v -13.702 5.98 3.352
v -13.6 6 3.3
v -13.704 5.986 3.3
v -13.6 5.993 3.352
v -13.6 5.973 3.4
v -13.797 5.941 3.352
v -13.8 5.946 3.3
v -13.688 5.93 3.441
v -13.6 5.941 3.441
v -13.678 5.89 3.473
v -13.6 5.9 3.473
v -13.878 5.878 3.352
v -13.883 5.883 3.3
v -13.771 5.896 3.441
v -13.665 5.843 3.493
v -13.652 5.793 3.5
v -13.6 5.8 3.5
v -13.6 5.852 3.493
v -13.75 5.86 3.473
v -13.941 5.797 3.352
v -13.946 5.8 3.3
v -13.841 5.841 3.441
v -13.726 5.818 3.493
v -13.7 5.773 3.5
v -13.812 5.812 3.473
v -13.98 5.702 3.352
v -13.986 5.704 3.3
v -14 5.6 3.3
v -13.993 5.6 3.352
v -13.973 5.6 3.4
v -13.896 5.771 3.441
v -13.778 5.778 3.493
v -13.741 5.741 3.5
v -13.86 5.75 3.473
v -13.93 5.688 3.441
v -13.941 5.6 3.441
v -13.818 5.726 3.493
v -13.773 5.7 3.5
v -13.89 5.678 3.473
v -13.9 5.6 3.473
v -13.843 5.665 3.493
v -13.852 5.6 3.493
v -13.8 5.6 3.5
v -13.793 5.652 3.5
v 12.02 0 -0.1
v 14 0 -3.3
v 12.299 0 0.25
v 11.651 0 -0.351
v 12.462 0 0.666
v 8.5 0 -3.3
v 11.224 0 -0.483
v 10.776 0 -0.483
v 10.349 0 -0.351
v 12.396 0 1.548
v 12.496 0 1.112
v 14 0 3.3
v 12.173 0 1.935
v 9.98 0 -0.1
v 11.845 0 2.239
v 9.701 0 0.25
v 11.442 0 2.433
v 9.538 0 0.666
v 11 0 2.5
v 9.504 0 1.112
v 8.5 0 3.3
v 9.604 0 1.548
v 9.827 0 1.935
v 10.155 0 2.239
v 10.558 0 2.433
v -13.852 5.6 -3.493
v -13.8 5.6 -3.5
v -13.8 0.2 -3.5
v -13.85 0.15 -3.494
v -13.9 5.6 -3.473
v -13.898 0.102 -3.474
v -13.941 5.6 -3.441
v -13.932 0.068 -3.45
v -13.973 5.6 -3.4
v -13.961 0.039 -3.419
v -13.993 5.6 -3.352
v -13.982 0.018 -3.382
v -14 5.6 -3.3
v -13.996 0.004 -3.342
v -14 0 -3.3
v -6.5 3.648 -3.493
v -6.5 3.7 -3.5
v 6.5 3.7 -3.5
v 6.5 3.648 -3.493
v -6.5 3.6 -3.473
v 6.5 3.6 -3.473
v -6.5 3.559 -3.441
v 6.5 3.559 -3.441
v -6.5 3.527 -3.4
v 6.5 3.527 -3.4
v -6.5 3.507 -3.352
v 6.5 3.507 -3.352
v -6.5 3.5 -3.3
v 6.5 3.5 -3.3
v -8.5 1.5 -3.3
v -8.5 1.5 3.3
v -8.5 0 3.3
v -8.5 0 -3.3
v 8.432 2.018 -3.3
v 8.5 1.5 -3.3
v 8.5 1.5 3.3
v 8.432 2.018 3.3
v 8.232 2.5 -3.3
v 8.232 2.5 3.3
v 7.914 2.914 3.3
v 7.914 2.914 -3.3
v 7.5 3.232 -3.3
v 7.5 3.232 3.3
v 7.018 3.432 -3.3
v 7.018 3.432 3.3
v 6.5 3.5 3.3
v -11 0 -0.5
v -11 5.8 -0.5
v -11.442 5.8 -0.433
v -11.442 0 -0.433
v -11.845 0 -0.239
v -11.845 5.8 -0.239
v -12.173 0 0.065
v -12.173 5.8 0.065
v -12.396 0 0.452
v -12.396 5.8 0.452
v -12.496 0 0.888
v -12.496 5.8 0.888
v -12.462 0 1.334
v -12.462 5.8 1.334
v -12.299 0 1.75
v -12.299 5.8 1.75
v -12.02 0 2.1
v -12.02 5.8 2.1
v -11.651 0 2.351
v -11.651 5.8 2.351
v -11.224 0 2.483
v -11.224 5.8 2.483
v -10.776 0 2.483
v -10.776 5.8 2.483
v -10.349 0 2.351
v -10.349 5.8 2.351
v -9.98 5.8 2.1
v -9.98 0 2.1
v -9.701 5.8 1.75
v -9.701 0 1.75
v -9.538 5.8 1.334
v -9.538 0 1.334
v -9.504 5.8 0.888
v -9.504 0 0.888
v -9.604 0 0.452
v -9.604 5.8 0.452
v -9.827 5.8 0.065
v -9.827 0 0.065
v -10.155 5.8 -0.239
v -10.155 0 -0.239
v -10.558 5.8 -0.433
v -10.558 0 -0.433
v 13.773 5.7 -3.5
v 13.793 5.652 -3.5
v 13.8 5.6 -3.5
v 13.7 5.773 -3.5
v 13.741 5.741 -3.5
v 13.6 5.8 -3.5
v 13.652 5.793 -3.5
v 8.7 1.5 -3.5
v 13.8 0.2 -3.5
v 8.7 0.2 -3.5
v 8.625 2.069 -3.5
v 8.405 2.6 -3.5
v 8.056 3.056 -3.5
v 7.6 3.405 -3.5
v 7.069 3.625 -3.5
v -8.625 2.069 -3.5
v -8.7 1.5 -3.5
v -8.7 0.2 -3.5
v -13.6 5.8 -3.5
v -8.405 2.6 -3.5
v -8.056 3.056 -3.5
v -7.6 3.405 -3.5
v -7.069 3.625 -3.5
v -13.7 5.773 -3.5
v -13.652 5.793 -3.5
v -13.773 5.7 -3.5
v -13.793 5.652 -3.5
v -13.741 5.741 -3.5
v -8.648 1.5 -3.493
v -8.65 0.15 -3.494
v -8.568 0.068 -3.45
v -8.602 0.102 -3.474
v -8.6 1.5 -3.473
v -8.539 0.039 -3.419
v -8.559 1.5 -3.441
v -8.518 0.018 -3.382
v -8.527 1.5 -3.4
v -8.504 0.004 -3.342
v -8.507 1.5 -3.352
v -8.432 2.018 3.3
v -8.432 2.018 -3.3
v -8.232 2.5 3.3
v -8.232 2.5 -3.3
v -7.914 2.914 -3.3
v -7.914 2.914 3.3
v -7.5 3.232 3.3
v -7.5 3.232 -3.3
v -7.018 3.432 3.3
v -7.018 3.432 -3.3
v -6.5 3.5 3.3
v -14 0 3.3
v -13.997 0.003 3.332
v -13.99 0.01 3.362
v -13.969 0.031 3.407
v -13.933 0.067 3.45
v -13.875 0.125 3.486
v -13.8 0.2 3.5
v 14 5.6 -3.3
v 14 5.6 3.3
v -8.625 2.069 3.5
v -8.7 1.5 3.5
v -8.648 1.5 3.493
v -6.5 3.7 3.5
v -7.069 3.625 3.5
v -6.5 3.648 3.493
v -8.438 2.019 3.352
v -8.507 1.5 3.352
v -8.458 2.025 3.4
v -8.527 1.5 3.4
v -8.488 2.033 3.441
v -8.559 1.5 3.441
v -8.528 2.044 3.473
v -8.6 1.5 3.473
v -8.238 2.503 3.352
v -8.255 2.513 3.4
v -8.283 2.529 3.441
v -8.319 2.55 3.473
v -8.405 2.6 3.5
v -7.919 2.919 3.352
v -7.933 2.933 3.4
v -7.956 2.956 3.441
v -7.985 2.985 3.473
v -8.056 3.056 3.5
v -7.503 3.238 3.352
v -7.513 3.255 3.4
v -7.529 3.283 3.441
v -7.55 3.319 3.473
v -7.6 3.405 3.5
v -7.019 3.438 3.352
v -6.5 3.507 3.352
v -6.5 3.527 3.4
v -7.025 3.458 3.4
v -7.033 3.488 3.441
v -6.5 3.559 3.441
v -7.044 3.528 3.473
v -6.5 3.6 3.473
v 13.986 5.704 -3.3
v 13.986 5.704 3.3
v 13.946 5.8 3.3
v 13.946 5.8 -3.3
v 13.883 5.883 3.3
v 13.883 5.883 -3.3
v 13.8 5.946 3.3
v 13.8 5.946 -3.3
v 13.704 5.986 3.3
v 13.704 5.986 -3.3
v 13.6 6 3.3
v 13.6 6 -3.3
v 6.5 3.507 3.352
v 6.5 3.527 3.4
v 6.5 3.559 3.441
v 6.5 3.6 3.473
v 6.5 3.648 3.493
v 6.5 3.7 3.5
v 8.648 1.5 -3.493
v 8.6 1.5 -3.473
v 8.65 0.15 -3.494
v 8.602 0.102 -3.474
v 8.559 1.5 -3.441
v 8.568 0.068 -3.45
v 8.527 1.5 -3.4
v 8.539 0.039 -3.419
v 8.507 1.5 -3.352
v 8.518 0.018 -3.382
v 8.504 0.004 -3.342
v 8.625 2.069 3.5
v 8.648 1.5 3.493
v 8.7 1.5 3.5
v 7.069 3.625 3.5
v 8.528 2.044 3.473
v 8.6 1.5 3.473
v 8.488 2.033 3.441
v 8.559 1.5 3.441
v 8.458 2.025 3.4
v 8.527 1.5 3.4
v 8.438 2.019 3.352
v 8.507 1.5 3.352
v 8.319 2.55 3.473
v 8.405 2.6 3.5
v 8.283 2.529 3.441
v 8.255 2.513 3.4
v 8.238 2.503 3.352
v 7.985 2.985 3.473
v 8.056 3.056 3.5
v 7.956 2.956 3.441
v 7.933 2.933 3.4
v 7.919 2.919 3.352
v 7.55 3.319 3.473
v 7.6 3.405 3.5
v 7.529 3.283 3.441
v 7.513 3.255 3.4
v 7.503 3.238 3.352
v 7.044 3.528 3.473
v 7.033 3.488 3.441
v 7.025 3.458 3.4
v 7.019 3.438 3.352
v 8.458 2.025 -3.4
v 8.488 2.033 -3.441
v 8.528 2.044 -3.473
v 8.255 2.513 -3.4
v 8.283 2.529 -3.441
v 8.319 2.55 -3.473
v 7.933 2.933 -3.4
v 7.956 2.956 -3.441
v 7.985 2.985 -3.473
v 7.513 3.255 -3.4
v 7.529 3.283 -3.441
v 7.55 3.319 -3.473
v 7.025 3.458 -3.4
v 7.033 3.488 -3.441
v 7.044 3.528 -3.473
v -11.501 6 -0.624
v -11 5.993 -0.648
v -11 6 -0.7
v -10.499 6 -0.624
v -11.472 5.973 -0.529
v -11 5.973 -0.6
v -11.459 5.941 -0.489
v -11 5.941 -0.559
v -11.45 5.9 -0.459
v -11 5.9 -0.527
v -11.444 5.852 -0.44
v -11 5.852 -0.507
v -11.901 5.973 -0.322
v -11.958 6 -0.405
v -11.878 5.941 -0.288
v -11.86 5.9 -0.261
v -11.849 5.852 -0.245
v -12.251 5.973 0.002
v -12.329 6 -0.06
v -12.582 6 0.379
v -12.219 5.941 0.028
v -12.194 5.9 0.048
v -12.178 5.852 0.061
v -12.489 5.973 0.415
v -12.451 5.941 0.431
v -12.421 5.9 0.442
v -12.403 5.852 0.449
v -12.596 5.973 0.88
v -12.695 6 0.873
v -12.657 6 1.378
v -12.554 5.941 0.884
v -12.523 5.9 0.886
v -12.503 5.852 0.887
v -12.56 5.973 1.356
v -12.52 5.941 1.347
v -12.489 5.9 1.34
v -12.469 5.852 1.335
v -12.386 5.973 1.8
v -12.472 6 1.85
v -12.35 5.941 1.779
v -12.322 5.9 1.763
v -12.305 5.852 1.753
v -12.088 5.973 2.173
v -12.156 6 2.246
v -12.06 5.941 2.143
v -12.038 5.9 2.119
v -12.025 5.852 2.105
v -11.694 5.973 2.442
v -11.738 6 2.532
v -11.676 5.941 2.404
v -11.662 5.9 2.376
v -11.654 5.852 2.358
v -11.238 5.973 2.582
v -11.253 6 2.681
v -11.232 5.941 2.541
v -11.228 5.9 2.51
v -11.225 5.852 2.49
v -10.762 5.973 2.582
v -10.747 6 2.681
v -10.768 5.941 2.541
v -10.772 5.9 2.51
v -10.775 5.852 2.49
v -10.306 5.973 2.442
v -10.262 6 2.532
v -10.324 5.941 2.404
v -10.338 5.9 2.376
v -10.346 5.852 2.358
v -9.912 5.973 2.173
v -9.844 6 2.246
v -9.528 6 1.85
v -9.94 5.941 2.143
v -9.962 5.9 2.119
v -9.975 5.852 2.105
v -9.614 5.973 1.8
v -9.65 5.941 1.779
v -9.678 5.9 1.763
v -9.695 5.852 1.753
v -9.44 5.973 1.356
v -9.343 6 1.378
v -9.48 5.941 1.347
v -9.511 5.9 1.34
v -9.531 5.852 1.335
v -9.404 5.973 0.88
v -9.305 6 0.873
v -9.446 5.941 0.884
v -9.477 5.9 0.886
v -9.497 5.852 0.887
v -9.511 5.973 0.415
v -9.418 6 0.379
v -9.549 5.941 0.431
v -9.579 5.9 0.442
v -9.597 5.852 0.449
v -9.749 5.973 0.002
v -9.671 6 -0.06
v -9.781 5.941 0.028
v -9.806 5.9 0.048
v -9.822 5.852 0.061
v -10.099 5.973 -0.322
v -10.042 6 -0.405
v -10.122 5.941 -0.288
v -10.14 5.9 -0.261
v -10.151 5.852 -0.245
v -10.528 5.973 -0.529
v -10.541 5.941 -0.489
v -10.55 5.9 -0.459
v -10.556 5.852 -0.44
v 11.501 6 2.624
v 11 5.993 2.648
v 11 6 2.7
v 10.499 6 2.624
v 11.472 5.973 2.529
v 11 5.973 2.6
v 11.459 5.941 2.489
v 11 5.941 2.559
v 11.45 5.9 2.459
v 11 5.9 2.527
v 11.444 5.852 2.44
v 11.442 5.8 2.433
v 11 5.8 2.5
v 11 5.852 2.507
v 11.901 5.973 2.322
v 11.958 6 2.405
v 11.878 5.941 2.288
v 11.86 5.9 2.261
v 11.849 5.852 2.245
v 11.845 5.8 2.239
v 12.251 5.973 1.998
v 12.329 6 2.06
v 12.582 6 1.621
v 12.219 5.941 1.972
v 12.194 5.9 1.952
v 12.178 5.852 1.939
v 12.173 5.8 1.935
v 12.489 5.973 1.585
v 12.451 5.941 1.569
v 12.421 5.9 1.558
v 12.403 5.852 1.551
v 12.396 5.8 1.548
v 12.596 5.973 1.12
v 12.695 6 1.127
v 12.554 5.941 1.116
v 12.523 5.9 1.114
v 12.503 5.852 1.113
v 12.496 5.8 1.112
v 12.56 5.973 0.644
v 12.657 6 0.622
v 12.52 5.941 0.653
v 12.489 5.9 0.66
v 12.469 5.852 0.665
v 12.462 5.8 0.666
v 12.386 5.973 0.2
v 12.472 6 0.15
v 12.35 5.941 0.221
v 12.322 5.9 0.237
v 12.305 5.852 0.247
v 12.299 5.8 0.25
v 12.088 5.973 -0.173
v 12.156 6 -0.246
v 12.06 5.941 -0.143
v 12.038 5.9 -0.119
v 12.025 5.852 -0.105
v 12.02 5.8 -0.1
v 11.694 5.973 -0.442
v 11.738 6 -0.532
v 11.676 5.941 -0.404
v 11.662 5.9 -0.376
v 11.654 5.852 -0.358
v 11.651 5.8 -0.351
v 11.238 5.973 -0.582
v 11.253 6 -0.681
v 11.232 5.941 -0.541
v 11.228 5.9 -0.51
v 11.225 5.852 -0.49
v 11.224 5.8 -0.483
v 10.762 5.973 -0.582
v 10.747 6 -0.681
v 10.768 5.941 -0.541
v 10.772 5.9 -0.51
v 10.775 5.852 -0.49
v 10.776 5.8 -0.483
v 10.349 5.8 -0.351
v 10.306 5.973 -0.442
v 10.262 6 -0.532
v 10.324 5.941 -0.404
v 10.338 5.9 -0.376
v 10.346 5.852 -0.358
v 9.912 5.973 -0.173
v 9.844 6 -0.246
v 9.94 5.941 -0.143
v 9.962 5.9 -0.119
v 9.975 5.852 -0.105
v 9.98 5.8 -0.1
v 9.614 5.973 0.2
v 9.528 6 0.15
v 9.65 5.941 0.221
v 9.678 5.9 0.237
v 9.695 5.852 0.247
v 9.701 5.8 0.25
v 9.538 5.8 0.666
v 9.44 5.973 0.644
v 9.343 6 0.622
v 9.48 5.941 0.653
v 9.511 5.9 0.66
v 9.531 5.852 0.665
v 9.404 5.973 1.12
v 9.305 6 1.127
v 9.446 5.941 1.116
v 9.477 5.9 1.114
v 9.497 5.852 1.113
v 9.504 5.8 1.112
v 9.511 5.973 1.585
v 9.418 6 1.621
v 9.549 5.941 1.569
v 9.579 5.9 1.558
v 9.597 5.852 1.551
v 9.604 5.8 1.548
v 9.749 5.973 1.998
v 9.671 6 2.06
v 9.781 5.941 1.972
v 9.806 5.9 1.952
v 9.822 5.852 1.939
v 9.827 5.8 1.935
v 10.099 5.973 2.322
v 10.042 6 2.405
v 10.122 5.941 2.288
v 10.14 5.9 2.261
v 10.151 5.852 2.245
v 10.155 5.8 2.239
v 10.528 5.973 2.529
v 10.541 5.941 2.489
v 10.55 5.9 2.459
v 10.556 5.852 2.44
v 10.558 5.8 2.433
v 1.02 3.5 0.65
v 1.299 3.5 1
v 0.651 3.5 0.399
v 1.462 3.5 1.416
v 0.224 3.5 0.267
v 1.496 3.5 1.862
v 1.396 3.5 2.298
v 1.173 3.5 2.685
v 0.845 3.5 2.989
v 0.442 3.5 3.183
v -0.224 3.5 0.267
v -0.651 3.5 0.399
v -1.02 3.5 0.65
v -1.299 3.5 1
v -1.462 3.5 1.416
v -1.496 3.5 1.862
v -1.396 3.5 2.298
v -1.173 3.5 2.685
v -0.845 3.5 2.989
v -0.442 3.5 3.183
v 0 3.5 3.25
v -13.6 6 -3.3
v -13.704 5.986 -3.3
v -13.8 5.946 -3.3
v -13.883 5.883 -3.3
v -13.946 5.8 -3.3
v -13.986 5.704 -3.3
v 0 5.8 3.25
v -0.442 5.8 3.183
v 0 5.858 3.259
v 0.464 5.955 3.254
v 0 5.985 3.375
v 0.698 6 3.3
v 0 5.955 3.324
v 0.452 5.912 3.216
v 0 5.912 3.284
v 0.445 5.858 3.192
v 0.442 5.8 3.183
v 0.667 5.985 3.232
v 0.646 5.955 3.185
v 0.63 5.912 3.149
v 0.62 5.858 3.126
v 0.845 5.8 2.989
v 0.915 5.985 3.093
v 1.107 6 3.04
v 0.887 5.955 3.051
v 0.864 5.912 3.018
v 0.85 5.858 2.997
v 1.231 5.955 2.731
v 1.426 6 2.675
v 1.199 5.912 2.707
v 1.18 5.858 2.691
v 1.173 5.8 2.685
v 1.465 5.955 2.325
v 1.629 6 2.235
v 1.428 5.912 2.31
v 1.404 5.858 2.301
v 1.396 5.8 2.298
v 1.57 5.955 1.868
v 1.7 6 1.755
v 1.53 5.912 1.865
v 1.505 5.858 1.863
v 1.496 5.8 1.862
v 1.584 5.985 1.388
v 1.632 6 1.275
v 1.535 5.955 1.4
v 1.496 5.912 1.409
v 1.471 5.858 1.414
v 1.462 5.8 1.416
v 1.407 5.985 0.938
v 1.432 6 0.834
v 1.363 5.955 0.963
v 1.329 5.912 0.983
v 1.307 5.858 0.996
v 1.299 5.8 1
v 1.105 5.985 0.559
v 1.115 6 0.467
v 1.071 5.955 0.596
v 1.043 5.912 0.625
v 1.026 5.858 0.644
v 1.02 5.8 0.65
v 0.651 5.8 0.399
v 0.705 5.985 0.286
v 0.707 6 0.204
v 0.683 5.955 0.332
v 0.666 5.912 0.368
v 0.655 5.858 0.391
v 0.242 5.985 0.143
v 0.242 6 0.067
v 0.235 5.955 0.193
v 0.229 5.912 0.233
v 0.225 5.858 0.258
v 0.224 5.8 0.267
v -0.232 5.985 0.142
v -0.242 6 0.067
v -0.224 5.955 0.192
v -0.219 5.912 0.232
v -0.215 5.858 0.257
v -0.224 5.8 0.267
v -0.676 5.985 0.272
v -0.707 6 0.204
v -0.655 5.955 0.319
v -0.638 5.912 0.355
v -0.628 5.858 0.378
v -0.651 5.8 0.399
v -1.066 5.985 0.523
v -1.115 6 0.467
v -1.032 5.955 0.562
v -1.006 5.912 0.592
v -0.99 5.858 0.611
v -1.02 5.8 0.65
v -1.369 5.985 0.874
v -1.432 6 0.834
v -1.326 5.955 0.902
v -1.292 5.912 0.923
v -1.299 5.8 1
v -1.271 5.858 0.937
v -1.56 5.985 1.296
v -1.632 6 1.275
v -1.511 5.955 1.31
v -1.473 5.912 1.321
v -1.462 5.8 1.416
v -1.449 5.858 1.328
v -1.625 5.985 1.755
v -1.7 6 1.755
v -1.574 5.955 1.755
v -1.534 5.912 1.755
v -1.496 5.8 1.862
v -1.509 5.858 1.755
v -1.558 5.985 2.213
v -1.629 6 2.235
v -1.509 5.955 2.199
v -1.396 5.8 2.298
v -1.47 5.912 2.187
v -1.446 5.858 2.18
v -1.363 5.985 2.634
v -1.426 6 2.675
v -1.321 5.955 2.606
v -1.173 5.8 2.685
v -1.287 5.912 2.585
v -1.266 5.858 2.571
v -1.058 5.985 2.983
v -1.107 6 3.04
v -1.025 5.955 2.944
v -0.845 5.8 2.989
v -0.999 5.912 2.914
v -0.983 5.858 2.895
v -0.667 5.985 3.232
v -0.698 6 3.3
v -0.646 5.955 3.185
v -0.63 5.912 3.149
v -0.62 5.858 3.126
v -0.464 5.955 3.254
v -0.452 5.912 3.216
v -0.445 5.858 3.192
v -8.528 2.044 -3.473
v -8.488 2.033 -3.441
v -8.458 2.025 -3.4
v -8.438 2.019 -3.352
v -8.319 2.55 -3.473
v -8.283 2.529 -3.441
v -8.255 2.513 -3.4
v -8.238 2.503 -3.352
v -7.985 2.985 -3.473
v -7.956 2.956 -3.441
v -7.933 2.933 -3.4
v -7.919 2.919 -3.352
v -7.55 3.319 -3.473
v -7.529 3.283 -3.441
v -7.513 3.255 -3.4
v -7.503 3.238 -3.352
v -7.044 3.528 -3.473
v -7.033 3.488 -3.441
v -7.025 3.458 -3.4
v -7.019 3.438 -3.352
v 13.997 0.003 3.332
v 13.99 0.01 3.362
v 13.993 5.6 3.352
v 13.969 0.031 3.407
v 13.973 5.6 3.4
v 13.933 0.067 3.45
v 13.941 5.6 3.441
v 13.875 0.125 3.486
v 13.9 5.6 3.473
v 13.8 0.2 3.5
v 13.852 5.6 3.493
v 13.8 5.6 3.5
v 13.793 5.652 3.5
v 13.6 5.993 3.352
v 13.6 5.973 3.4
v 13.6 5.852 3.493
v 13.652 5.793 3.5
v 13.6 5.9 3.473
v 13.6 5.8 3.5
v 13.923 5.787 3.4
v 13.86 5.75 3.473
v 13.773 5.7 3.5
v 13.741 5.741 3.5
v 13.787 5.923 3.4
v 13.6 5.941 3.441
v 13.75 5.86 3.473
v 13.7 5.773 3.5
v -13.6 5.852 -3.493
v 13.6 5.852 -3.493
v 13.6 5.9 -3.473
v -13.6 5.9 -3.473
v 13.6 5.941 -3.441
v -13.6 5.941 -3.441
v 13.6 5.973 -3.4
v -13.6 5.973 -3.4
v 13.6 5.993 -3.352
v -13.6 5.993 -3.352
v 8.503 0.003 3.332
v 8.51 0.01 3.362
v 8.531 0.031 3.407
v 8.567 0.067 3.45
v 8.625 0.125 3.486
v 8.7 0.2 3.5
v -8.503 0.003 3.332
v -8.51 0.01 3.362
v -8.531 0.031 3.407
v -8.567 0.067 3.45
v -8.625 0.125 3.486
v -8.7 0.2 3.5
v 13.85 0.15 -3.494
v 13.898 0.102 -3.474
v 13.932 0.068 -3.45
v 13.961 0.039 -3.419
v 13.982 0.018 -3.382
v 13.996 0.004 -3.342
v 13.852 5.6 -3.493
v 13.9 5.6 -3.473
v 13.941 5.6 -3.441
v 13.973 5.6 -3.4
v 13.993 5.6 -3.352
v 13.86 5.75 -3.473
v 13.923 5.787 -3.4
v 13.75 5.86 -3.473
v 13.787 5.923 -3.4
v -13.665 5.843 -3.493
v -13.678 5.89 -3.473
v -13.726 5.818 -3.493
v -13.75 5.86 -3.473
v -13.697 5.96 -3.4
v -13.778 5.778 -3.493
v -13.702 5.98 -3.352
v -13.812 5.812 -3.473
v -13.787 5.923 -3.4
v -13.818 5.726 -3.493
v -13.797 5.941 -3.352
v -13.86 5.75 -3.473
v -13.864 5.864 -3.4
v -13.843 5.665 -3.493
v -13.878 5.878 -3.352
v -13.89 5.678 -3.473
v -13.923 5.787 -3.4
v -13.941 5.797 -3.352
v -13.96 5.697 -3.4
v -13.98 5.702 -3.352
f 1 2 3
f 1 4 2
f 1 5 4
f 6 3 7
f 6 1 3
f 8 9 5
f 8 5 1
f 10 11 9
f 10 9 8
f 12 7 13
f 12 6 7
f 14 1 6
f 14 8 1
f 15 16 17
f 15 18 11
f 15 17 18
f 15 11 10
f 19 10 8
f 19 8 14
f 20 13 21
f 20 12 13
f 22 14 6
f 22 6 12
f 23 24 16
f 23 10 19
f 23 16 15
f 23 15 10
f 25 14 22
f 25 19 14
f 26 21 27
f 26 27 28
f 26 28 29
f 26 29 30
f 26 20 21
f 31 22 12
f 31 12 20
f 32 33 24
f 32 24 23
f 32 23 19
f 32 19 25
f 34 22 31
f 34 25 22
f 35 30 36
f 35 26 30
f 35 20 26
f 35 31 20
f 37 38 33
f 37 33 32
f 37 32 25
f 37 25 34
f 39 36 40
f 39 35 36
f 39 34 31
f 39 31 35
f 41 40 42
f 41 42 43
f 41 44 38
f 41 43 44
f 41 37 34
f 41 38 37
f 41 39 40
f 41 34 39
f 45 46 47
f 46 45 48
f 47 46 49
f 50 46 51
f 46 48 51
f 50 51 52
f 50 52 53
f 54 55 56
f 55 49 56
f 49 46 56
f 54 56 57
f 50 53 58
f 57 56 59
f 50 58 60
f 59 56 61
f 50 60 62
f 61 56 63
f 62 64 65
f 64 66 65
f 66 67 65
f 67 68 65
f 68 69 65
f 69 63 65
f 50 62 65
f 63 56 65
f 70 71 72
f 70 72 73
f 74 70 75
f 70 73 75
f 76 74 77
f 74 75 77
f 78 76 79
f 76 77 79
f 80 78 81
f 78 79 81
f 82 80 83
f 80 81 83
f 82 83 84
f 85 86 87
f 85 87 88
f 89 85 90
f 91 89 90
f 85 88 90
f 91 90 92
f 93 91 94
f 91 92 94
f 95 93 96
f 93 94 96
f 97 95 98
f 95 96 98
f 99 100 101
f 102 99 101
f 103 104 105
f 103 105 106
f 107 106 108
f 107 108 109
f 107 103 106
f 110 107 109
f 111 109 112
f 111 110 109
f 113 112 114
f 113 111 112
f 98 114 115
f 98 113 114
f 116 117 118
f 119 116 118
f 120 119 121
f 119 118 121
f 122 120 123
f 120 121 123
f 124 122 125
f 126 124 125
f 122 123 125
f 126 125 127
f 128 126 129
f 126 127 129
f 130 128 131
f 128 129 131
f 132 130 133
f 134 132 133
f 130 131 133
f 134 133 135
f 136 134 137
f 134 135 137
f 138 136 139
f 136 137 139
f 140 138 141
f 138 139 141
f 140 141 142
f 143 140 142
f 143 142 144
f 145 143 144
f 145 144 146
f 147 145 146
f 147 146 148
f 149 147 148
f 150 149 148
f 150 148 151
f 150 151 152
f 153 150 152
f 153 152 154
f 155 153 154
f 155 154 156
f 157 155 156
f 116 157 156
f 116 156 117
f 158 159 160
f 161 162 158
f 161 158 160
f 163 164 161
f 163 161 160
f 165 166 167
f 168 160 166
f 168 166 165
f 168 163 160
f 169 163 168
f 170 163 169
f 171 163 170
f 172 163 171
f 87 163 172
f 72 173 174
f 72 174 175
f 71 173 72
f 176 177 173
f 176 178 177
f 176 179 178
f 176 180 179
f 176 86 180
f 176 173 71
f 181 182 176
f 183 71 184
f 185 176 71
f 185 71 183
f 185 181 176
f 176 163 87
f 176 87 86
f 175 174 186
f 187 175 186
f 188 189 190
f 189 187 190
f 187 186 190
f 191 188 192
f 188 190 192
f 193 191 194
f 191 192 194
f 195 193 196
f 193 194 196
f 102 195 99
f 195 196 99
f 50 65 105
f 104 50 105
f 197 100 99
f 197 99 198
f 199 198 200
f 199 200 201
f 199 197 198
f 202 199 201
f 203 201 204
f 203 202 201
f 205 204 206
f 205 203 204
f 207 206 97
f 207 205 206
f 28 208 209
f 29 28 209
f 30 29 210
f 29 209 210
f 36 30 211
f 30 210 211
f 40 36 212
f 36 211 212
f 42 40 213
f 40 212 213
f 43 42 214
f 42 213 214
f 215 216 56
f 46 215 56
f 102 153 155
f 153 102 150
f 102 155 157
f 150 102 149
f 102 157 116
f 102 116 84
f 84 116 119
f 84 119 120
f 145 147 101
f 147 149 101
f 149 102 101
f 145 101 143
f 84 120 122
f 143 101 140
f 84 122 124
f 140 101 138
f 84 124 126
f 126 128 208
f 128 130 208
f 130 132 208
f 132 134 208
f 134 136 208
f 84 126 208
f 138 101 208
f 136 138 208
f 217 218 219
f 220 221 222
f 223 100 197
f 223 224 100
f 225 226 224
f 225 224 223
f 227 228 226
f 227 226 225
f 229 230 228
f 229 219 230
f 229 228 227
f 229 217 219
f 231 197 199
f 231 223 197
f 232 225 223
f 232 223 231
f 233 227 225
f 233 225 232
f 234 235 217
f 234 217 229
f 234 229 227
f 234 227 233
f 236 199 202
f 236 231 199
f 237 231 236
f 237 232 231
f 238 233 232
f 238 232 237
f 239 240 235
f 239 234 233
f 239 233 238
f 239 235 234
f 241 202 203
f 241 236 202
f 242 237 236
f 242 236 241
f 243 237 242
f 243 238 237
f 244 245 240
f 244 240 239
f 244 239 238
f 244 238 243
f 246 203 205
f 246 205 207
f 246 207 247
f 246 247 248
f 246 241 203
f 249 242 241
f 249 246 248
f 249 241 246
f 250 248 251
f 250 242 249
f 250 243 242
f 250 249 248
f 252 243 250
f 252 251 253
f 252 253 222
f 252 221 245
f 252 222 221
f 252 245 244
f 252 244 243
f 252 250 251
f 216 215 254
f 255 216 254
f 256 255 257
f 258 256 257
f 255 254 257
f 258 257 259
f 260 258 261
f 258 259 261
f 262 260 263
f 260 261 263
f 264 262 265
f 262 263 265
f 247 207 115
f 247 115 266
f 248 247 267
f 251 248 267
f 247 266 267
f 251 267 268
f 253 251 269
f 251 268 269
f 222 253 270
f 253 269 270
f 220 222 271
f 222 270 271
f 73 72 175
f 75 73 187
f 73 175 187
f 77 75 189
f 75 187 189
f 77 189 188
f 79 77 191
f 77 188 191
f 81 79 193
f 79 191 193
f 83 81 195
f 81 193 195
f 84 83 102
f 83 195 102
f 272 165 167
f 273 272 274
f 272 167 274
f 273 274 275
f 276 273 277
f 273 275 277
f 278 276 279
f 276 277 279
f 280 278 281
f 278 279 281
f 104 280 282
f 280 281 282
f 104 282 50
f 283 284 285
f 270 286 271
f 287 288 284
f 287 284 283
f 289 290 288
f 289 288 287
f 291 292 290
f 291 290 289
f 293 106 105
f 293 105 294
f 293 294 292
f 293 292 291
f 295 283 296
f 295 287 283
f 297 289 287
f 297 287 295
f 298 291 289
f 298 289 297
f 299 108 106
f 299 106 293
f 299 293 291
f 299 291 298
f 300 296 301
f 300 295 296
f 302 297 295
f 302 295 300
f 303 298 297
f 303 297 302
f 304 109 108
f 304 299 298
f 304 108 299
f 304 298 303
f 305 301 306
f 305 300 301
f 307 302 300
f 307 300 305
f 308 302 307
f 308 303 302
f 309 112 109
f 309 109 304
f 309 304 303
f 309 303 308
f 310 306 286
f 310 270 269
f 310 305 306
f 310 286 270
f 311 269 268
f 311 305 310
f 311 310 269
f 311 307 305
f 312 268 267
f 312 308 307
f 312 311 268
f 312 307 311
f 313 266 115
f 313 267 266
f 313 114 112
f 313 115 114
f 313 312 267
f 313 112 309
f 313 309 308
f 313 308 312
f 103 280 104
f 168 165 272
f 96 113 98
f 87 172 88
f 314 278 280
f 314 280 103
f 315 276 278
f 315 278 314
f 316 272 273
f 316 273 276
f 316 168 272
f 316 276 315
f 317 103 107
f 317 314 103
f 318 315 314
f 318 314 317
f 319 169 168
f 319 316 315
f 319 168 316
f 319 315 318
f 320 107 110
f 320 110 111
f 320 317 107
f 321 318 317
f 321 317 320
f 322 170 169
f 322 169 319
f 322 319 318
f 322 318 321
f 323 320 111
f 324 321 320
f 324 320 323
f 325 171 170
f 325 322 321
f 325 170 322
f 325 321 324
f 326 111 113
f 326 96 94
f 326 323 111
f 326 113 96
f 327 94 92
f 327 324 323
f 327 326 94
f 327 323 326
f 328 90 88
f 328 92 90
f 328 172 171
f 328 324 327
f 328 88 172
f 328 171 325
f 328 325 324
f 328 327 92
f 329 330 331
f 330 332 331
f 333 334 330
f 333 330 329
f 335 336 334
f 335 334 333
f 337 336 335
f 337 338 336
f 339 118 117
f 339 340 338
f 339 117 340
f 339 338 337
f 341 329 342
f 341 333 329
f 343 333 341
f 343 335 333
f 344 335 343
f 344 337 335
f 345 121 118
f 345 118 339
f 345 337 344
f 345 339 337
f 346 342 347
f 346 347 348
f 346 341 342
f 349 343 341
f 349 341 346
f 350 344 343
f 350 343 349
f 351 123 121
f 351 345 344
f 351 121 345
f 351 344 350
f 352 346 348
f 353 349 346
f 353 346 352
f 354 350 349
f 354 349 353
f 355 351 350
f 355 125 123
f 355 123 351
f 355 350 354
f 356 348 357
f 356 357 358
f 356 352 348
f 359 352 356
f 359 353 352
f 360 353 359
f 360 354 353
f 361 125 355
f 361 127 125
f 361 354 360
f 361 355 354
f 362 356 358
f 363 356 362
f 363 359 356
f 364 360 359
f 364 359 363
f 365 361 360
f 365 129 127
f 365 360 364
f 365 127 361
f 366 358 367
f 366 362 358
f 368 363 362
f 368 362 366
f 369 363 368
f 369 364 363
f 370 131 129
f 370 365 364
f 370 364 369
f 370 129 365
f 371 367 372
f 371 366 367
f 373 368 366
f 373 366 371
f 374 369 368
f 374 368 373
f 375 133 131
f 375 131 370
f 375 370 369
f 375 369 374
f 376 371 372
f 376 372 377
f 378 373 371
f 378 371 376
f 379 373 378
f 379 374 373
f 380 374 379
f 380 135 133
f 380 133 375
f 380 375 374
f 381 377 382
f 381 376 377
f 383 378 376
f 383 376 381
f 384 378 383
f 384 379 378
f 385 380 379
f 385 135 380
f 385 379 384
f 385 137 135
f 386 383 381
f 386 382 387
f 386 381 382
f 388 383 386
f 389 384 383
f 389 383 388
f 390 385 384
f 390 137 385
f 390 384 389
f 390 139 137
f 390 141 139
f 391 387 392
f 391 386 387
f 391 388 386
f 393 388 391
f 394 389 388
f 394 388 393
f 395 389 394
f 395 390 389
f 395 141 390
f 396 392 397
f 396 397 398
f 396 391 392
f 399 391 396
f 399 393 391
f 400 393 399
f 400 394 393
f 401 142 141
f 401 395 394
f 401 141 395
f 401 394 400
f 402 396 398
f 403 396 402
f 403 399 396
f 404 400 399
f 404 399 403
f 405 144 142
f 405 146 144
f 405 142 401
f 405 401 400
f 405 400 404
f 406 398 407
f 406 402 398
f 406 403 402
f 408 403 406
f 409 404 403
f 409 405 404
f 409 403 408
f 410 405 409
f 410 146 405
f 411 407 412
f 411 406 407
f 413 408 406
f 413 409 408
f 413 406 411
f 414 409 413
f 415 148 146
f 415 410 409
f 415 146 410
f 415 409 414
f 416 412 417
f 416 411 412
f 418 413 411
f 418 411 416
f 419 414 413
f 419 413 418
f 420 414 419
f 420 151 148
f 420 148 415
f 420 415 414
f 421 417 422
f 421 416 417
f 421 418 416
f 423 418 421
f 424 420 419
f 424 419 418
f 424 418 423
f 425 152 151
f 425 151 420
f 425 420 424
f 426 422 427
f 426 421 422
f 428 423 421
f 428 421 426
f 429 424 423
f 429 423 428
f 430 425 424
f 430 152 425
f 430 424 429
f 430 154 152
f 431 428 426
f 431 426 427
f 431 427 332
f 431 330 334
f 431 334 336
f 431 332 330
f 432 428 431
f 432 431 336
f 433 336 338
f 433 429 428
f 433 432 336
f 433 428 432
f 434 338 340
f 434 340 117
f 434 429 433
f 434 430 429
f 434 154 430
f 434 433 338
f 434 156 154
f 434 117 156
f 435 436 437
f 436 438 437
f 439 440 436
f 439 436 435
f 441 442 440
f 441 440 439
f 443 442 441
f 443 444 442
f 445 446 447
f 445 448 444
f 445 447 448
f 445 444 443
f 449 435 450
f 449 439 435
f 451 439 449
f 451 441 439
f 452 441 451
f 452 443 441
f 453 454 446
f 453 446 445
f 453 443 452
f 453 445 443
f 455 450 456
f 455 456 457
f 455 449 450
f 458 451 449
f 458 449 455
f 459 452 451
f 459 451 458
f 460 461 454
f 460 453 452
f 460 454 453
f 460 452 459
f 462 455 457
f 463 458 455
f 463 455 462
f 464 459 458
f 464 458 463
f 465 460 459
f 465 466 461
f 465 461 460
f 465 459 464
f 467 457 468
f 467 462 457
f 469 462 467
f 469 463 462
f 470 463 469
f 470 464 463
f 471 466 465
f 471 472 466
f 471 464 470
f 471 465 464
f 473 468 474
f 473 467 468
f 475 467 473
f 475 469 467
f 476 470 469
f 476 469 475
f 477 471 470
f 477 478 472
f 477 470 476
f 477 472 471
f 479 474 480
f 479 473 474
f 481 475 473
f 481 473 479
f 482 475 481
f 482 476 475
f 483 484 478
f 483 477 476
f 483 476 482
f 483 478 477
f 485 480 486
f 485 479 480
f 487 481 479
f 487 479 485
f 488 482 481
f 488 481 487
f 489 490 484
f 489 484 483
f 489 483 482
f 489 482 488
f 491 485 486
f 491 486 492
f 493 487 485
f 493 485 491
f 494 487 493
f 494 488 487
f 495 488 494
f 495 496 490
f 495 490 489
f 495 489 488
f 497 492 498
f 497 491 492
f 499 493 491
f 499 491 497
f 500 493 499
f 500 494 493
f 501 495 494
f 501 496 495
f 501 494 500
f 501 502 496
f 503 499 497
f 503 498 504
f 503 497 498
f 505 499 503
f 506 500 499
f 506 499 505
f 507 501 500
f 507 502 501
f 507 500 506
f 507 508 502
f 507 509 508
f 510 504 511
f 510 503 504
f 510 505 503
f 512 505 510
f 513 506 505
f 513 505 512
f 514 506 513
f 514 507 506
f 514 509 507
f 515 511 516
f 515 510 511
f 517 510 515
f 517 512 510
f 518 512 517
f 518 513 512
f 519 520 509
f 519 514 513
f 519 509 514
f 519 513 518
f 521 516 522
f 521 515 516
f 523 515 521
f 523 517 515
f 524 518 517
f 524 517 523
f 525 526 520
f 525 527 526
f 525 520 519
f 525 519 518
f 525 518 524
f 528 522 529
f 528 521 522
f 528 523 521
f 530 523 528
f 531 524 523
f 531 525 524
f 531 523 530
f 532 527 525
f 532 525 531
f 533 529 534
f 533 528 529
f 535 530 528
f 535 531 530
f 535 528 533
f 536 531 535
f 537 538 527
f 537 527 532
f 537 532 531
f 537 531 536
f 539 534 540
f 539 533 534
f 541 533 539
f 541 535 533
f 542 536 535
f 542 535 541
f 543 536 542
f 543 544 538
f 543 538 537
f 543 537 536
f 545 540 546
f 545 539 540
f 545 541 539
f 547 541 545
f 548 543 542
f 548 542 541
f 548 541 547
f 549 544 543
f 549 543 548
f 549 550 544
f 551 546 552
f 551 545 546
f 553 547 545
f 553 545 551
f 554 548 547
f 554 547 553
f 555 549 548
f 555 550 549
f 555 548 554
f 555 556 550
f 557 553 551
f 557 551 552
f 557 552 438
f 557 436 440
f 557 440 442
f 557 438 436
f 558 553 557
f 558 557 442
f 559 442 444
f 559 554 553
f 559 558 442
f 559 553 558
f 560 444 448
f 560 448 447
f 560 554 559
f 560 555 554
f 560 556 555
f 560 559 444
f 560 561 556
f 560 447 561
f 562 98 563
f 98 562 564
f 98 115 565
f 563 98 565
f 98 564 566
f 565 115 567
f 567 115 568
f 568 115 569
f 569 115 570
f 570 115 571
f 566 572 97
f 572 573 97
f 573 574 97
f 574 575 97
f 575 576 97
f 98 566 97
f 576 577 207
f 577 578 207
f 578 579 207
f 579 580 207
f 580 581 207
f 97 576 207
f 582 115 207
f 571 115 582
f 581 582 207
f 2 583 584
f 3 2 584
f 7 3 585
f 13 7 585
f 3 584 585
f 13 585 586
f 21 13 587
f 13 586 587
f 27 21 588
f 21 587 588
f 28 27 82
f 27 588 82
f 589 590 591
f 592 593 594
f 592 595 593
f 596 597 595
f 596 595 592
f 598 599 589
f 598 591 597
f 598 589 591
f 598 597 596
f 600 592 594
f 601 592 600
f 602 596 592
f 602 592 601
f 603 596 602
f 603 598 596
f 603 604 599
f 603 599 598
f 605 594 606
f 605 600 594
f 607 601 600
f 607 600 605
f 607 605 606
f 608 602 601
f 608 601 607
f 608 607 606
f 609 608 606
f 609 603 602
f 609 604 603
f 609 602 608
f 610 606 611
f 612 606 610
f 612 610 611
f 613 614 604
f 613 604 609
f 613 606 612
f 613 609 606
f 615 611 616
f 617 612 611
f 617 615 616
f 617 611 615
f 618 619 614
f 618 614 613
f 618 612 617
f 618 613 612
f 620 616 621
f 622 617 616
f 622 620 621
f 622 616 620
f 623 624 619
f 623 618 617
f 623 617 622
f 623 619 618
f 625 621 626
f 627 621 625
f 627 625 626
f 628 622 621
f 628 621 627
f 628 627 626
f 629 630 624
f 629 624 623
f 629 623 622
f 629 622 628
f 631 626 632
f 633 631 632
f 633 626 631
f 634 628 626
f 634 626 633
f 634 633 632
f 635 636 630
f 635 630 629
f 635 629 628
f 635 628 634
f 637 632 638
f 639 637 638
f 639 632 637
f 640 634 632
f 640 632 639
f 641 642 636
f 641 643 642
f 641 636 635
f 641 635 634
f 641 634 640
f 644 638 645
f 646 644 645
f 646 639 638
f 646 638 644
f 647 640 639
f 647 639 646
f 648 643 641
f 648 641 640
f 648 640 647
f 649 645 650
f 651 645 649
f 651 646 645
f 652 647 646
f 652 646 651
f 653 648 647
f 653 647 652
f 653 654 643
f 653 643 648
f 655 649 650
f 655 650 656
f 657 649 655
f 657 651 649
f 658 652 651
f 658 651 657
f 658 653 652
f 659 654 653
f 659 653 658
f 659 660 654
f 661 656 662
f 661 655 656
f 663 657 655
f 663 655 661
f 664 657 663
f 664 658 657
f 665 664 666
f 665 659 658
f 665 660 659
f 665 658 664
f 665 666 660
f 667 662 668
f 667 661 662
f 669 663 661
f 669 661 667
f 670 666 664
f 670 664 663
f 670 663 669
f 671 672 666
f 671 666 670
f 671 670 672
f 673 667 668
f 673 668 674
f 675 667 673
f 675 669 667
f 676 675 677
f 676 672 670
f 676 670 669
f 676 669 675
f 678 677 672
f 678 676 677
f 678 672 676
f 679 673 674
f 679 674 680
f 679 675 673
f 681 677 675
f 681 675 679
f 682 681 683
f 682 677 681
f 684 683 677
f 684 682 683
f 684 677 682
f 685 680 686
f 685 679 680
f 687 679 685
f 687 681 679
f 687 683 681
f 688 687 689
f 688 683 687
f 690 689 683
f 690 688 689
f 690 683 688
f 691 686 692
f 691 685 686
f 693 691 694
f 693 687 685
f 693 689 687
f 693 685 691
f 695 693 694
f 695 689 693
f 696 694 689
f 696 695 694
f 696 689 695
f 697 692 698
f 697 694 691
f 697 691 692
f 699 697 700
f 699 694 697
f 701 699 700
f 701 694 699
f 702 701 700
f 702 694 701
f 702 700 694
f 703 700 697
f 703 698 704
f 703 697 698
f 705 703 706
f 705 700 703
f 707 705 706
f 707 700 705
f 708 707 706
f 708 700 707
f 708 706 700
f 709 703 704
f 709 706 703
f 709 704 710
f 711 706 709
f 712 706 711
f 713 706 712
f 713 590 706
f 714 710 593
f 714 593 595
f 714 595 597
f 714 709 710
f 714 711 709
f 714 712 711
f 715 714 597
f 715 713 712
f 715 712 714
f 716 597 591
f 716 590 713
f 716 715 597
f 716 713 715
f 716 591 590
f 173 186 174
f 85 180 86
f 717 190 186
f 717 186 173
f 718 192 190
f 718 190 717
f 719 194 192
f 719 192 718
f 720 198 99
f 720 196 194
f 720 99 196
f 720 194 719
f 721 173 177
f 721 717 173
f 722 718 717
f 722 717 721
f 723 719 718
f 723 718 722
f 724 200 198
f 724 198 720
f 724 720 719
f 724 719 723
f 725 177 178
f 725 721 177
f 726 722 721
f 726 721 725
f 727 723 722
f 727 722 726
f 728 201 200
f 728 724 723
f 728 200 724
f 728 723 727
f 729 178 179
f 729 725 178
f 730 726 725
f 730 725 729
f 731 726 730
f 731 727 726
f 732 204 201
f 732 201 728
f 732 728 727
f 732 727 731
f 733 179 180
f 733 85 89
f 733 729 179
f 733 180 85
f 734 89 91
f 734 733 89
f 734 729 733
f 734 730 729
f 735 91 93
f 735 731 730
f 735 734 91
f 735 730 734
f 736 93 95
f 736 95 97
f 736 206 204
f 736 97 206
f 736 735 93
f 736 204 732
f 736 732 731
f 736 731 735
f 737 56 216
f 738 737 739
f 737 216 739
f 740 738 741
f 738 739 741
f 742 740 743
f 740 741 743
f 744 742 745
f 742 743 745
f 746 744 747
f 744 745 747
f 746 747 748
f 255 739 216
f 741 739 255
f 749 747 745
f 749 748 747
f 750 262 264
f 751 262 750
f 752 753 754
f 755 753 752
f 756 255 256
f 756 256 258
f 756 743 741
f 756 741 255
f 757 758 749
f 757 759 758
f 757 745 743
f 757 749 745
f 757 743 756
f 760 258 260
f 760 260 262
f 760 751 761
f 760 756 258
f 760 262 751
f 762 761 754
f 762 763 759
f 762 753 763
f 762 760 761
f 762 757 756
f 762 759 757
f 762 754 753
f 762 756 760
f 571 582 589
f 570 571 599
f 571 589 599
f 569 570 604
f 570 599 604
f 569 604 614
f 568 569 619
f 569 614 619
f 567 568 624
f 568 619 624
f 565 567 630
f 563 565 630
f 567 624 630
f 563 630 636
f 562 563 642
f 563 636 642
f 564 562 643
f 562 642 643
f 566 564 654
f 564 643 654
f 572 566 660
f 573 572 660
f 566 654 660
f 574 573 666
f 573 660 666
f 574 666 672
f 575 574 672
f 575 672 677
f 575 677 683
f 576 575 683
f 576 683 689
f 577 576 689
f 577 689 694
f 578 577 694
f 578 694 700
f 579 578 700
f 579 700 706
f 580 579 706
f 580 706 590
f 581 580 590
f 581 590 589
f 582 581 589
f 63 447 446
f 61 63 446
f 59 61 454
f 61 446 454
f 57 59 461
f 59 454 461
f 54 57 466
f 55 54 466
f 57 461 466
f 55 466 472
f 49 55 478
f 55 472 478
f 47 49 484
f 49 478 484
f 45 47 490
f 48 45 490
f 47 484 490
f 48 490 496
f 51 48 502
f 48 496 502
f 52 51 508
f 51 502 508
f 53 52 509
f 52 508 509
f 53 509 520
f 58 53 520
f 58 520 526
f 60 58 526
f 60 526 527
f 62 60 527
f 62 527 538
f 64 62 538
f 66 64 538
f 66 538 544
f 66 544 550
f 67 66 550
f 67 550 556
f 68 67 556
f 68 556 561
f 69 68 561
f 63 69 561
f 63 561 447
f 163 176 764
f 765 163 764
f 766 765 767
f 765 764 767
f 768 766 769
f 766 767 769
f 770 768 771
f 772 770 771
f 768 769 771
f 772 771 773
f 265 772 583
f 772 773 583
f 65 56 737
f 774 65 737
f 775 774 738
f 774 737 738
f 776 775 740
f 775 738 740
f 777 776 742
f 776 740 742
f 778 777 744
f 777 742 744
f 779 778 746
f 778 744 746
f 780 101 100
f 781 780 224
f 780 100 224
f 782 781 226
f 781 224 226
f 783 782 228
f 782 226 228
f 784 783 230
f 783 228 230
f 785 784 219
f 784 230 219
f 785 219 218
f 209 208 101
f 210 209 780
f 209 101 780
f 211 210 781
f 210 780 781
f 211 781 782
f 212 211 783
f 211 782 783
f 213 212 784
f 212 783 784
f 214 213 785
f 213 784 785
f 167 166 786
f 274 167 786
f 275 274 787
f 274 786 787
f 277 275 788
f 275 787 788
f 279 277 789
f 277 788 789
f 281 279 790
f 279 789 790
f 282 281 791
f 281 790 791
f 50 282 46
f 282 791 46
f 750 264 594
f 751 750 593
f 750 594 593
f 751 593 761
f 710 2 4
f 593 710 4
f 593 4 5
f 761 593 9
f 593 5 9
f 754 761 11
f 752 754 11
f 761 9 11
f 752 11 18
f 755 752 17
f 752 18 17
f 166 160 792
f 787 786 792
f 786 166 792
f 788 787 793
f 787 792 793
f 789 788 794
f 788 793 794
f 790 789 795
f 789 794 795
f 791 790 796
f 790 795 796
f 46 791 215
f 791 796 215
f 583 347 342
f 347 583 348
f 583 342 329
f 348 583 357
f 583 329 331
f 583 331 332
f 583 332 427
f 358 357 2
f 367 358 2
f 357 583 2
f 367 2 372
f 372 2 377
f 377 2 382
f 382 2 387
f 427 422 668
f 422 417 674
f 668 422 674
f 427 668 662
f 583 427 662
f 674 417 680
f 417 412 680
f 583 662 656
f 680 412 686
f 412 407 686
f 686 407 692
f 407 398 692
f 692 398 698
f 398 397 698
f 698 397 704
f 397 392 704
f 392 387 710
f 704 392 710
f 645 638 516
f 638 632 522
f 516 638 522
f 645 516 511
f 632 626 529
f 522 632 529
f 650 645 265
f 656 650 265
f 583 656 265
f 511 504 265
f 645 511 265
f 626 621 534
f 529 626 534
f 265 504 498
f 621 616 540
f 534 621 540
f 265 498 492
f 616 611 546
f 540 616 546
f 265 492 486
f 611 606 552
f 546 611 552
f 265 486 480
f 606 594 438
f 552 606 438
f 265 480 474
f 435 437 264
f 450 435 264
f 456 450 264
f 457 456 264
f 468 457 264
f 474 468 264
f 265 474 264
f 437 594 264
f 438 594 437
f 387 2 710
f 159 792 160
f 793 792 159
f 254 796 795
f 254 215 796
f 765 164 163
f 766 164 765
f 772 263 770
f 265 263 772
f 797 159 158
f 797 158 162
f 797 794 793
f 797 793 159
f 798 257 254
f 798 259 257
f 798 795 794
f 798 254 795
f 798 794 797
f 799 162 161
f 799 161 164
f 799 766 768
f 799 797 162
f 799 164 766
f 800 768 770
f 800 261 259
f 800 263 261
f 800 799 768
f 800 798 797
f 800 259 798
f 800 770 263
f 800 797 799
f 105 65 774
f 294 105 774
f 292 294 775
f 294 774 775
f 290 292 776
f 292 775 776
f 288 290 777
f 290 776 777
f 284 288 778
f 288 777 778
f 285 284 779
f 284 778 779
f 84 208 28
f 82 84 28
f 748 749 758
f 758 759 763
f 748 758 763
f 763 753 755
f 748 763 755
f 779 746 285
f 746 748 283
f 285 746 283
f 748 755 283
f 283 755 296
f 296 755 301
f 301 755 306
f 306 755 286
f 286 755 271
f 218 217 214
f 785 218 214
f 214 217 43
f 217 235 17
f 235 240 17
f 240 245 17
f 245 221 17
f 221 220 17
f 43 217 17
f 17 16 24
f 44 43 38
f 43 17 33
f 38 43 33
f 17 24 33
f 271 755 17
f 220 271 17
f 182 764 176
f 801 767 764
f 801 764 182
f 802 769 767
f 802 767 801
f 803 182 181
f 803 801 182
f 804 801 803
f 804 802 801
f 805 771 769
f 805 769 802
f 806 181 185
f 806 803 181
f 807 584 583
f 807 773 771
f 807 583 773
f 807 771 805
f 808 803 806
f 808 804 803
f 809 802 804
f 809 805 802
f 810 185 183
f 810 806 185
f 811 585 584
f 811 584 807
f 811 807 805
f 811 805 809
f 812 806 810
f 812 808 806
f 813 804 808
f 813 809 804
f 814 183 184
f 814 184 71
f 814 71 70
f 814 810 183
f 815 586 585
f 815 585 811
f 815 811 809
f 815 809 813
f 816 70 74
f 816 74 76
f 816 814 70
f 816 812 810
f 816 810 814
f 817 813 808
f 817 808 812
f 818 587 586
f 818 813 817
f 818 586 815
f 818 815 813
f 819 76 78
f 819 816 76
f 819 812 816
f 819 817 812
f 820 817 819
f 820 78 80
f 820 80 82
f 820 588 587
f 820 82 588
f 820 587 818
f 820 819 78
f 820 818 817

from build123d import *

# Parameters (mm, degrees)
BOSS_EXTRUDE1_DEPTH = 3.5
SKETCH2_R           = 1.5
CUT_EXTRUDE1_DEPTH  = 16.628499608
FILLET1_R           = 2
FILLET2_R           = 0.4
FILLET3_R           = 0.2


with BuildPart() as part:
    # Sketch1 → Boss-Extrude1 (new, symmetric)
    with BuildSketch(Plane.XY):
        Polygon((-14, 0), (-14, 6), (14, 6), (14, 0), (8.5, 0), (8.5, 3.5), (-8.5, 3.5), (-8.5, 0), align=None)
    extrude(amount=BOSS_EXTRUDE1_DEPTH, both=True)

    # Sketch2 → Cut-Extrude1 (cut, through all)
    with BuildSketch(Plane(origin=(0, 6, 0), x_dir=(1, 0, 0), z_dir=(0, 1, 0))):
        with Locations(Location((11, -1, 0), (0, 0, 270))):
            Circle(SKETCH2_R)
        with Locations(Location((-11, -1, 0), (0, 0, 90))):
            Circle(SKETCH2_R)
        with Locations(Location((0, -1.75, 0), (0, 0, 270))):
            Circle(SKETCH2_R)
    extrude(amount=-CUT_EXTRUDE1_DEPTH, mode=Mode.SUBTRACT)

    # Fillet1
    fillet1_edges = [part.edges().sort_by_distance(p)[0] for p in [
        (8.5, 3.5, 0),
        (-8.5, 3.5, 0),
    ]]
    fillet(fillet1_edges, radius=FILLET1_R)

    # Fillet2
    fillet2_edges = [part.edges().sort_by_distance(p)[0] for p in [
        (-14, 6, 0),
        (14, 6, 0),
    ]]
    fillet(fillet2_edges, radius=FILLET2_R)

    # Fillet3
    # the kernel refuses this fillet: 0.2 mm, written as the material it takes off along each edge
    with BuildSketch(Plane(origin=(-8.5, 1.5, -3.5), x_dir=(-1, 0, 0), z_dir=(0, -1, 0)), Plane(origin=(8.5, -0.5, -3.5), x_dir=(1, 0, 0), z_dir=(0, 1, 0)), Plane(origin=(8.5, -0.5, 3.5), x_dir=(0, 0, -1), z_dir=(0, 1, 0)), Plane(origin=(-8.5, 1.5, 3.5), x_dir=(0, 0, -1), z_dir=(0, -1, 0))) as fillet3_piece_1:
        with BuildLine():
            CenterArc((FILLET3_R, -FILLET3_R), FILLET3_R, 90, 90)
            Line((0, -FILLET3_R), (0, 0))
            Line((0, 0), (FILLET3_R, 0))
        make_face()
    extrude(amount=2, mode=Mode.SUBTRACT)
    with BuildSketch(Plane(origin=(-8, 0, -3.5), x_dir=(0, 1, 0), z_dir=(-1, 0, 0)), Plane(origin=(14.5, 0, 3.5), x_dir=(0, 0, -1), z_dir=(-1, 0, 0)), Plane(origin=(-8, 0, 3.5), x_dir=(0, 0, -1), z_dir=(-1, 0, 0)), Plane(origin=(14.5, 0, -3.5), x_dir=(0, 1, 0), z_dir=(-1, 0, 0))) as fillet3_piece_2:
        with BuildLine():
            CenterArc((FILLET3_R, -FILLET3_R), FILLET3_R, 90, 90)
            Line((0, -FILLET3_R), (0, 0))
            Line((0, 0), (FILLET3_R, 0))
        make_face()
    extrude(amount=6.5, mode=Mode.SUBTRACT)
    with BuildSketch(Plane(origin=(14, 5.6, 3.5), x_dir=(0, 0, -1), z_dir=(0, -1, 0)), Plane(origin=(-14, -0.5, -3.5), x_dir=(1, 0, 0), z_dir=(0, 1, 0)), Plane(origin=(-14, -0.5, 3.5), x_dir=(0, 0, -1), z_dir=(0, 1, 0)), Plane(origin=(14, 5.6, -3.5), x_dir=(-1, 0, 0), z_dir=(0, -1, 0))) as fillet3_piece_3:
        with BuildLine():
            CenterArc((FILLET3_R, -FILLET3_R), FILLET3_R, 90, 90)
            Line((0, -FILLET3_R), (0, 0))
            Line((0, 0), (FILLET3_R, 0))
        make_face()
    extrude(amount=6.1, mode=Mode.SUBTRACT)
    with BuildSketch(Plane(origin=(11, 6, 1), x_dir=(0, 0, 1), z_dir=(-1, 0, 0))) as fillet3_piece_4:
        with BuildLine():
            CenterArc((1.5 + FILLET3_R, -FILLET3_R), FILLET3_R, 90, 90)
            Line((1.5, -FILLET3_R), (1.5, 0))
            Line((1.5, 0), (1.5 + FILLET3_R, 0))
        make_face()
    revolve(axis=Axis((11, 6, 1), (0, 1, 0)), mode=Mode.SUBTRACT)
    with BuildSketch(Plane(origin=(-11, 6, 1), x_dir=(0, 0, -1), z_dir=(1, 0, 0))) as fillet3_piece_5:
        with BuildLine():
            CenterArc((1.5 + FILLET3_R, -FILLET3_R), FILLET3_R, 90, 90)
            Line((1.5, -FILLET3_R), (1.5, 0))
            Line((1.5, 0), (1.5 + FILLET3_R, 0))
        make_face()
    revolve(axis=Axis((-11, 6, 1), (0, 1, 0)), mode=Mode.SUBTRACT)
    with BuildSketch(Plane(origin=(0, 6, 1.75), x_dir=(0, 0, 1), z_dir=(-1, 0, 0))) as fillet3_piece_6:
        with BuildLine():
            CenterArc((1.5 + FILLET3_R, -FILLET3_R), FILLET3_R, 90, 90)
            Line((1.5, -FILLET3_R), (1.5, 0))
            Line((1.5, 0), (1.5 + FILLET3_R, 0))
        make_face()
    revolve(axis=Axis((0, 6, 1.75), (0, 1, 0)), mode=Mode.SUBTRACT)
    with BuildSketch(Plane(origin=(6.5, 3.5, -3.5), x_dir=(0, 1, 0), z_dir=(-1, 0, 0)), Plane(origin=(6.5, 3.5, 3.5), x_dir=(0, 0, -1), z_dir=(-1, 0, 0))) as fillet3_piece_7:
        with BuildLine():
            CenterArc((FILLET3_R, -FILLET3_R), FILLET3_R, 90, 90)
            Line((0, -FILLET3_R), (0, 0))
            Line((0, 0), (FILLET3_R, 0))
        make_face()
    extrude(amount=13, mode=Mode.SUBTRACT)
    with BuildSketch(Plane(origin=(6.5, 1.5, -3.5), x_dir=(1, 0, 0), z_dir=(0, -1, 0))) as fillet3_piece_8:
        with BuildLine():
            CenterArc((2 + FILLET3_R, FILLET3_R), FILLET3_R, 180, 90)
            Line((2, FILLET3_R), (2, 0))
            Line((2, 0), (2 + FILLET3_R, 0))
        make_face()
    revolve(axis=Axis((6.5, 1.5, -3.5), (0, 0, 1)), revolution_arc=90, mode=Mode.SUBTRACT)
    with BuildSketch(Plane(origin=(6.5, 1.5, 3.5), x_dir=(1, 0, 0), z_dir=(0, -1, 0))) as fillet3_piece_9:
        with BuildLine():
            CenterArc((2 + FILLET3_R, -FILLET3_R), FILLET3_R, 90, 90)
            Line((2 + FILLET3_R, 0), (2, 0))
            Line((2, 0), (2, -FILLET3_R))
        make_face()
    revolve(axis=Axis((6.5, 1.5, 3.5), (0, 0, 1)), revolution_arc=90, mode=Mode.SUBTRACT)
    with BuildSketch(Plane(origin=(-6.5, 1.5, -3.5), x_dir=(-1, 0, 0), z_dir=(0, -1, 0))) as fillet3_piece_10:
        with BuildLine():
            CenterArc((2 + FILLET3_R, -FILLET3_R), FILLET3_R, 90, 90)
            Line((2, -FILLET3_R), (2, 0))
            Line((2, 0), (2 + FILLET3_R, 0))
        make_face()
    revolve(axis=Axis((-6.5, 1.5, -3.5), (0, 0, -1)), revolution_arc=90, mode=Mode.SUBTRACT)
    with BuildSketch(Plane(origin=(-6.5, 1.5, 3.5), x_dir=(-1, 0, 0), z_dir=(0, -1, 0))) as fillet3_piece_11:
        with BuildLine():
            CenterArc((2 + FILLET3_R, FILLET3_R), FILLET3_R, 180, 90)
            Line((2 + FILLET3_R, 0), (2, 0))
            Line((2, 0), (2, FILLET3_R))
        make_face()
    revolve(axis=Axis((-6.5, 1.5, 3.5), (0, 0, -1)), revolution_arc=90, mode=Mode.SUBTRACT)
    with BuildSketch(Plane(origin=(-13.6, 6, -3.5), x_dir=(0, -1, 0), z_dir=(1, 0, 0)), Plane(origin=(-13.6, 6, 3.5), x_dir=(0, 0, -1), z_dir=(1, 0, 0))) as fillet3_piece_12:
        with BuildLine():
            CenterArc((FILLET3_R, -FILLET3_R), FILLET3_R, 90, 90)
            Line((0, -FILLET3_R), (0, 0))
            Line((0, 0), (FILLET3_R, 0))
        make_face()
    extrude(amount=27.2, mode=Mode.SUBTRACT)
    with BuildSketch(Plane(origin=(-13.6, 5.6, -3.5), x_dir=(0, 1, 0), z_dir=(1, 0, 0))) as fillet3_piece_13:
        with BuildLine():
            CenterArc((0.4 - FILLET3_R, FILLET3_R), FILLET3_R, 270, 90)
            Line((0.4, FILLET3_R), (0.4, 0))
            Line((0.4, 0), (0.4 - FILLET3_R, 0))
        make_face()
    revolve(axis=Axis((-13.6, 5.6, -3.5), (0, 0, 1)), revolution_arc=90, mode=Mode.SUBTRACT)
    with BuildSketch(Plane(origin=(13.6, 5.6, -3.5), x_dir=(1, 0, 0), z_dir=(0, -1, 0))) as fillet3_piece_14:
        with BuildLine():
            CenterArc((0.4 - FILLET3_R, FILLET3_R), FILLET3_R, 270, 90)
            Line((0.4, FILLET3_R), (0.4, 0))
            Line((0.4, 0), (0.4 - FILLET3_R, 0))
        make_face()
    revolve(axis=Axis((13.6, 5.6, -3.5), (0, 0, 1)), revolution_arc=90, mode=Mode.SUBTRACT)
    with BuildSketch(Plane(origin=(-13.6, 5.6, 3.5), x_dir=(0, 1, 0), z_dir=(1, 0, 0))) as fillet3_piece_15:
        with BuildLine():
            CenterArc((0.4 - FILLET3_R, -FILLET3_R), FILLET3_R, 0, 90)
            Line((0.4 - FILLET3_R, 0), (0.4, 0))
            Line((0.4, 0), (0.4, -FILLET3_R))
        make_face()
    revolve(axis=Axis((-13.6, 5.6, 3.5), (0, 0, 1)), revolution_arc=90, mode=Mode.SUBTRACT)
    with BuildSketch(Plane(origin=(13.6, 5.6, 3.5), x_dir=(1, 0, 0), z_dir=(0, -1, 0))) as fillet3_piece_16:
        with BuildLine():
            CenterArc((0.4 - FILLET3_R, -FILLET3_R), FILLET3_R, 0, 90)
            Line((0.4 - FILLET3_R, 0), (0.4, 0))
            Line((0.4, 0), (0.4, -FILLET3_R))
        make_face()
    revolve(axis=Axis((13.6, 5.6, 3.5), (0, 0, 1)), revolution_arc=90, mode=Mode.SUBTRACT)


solid = part.part
